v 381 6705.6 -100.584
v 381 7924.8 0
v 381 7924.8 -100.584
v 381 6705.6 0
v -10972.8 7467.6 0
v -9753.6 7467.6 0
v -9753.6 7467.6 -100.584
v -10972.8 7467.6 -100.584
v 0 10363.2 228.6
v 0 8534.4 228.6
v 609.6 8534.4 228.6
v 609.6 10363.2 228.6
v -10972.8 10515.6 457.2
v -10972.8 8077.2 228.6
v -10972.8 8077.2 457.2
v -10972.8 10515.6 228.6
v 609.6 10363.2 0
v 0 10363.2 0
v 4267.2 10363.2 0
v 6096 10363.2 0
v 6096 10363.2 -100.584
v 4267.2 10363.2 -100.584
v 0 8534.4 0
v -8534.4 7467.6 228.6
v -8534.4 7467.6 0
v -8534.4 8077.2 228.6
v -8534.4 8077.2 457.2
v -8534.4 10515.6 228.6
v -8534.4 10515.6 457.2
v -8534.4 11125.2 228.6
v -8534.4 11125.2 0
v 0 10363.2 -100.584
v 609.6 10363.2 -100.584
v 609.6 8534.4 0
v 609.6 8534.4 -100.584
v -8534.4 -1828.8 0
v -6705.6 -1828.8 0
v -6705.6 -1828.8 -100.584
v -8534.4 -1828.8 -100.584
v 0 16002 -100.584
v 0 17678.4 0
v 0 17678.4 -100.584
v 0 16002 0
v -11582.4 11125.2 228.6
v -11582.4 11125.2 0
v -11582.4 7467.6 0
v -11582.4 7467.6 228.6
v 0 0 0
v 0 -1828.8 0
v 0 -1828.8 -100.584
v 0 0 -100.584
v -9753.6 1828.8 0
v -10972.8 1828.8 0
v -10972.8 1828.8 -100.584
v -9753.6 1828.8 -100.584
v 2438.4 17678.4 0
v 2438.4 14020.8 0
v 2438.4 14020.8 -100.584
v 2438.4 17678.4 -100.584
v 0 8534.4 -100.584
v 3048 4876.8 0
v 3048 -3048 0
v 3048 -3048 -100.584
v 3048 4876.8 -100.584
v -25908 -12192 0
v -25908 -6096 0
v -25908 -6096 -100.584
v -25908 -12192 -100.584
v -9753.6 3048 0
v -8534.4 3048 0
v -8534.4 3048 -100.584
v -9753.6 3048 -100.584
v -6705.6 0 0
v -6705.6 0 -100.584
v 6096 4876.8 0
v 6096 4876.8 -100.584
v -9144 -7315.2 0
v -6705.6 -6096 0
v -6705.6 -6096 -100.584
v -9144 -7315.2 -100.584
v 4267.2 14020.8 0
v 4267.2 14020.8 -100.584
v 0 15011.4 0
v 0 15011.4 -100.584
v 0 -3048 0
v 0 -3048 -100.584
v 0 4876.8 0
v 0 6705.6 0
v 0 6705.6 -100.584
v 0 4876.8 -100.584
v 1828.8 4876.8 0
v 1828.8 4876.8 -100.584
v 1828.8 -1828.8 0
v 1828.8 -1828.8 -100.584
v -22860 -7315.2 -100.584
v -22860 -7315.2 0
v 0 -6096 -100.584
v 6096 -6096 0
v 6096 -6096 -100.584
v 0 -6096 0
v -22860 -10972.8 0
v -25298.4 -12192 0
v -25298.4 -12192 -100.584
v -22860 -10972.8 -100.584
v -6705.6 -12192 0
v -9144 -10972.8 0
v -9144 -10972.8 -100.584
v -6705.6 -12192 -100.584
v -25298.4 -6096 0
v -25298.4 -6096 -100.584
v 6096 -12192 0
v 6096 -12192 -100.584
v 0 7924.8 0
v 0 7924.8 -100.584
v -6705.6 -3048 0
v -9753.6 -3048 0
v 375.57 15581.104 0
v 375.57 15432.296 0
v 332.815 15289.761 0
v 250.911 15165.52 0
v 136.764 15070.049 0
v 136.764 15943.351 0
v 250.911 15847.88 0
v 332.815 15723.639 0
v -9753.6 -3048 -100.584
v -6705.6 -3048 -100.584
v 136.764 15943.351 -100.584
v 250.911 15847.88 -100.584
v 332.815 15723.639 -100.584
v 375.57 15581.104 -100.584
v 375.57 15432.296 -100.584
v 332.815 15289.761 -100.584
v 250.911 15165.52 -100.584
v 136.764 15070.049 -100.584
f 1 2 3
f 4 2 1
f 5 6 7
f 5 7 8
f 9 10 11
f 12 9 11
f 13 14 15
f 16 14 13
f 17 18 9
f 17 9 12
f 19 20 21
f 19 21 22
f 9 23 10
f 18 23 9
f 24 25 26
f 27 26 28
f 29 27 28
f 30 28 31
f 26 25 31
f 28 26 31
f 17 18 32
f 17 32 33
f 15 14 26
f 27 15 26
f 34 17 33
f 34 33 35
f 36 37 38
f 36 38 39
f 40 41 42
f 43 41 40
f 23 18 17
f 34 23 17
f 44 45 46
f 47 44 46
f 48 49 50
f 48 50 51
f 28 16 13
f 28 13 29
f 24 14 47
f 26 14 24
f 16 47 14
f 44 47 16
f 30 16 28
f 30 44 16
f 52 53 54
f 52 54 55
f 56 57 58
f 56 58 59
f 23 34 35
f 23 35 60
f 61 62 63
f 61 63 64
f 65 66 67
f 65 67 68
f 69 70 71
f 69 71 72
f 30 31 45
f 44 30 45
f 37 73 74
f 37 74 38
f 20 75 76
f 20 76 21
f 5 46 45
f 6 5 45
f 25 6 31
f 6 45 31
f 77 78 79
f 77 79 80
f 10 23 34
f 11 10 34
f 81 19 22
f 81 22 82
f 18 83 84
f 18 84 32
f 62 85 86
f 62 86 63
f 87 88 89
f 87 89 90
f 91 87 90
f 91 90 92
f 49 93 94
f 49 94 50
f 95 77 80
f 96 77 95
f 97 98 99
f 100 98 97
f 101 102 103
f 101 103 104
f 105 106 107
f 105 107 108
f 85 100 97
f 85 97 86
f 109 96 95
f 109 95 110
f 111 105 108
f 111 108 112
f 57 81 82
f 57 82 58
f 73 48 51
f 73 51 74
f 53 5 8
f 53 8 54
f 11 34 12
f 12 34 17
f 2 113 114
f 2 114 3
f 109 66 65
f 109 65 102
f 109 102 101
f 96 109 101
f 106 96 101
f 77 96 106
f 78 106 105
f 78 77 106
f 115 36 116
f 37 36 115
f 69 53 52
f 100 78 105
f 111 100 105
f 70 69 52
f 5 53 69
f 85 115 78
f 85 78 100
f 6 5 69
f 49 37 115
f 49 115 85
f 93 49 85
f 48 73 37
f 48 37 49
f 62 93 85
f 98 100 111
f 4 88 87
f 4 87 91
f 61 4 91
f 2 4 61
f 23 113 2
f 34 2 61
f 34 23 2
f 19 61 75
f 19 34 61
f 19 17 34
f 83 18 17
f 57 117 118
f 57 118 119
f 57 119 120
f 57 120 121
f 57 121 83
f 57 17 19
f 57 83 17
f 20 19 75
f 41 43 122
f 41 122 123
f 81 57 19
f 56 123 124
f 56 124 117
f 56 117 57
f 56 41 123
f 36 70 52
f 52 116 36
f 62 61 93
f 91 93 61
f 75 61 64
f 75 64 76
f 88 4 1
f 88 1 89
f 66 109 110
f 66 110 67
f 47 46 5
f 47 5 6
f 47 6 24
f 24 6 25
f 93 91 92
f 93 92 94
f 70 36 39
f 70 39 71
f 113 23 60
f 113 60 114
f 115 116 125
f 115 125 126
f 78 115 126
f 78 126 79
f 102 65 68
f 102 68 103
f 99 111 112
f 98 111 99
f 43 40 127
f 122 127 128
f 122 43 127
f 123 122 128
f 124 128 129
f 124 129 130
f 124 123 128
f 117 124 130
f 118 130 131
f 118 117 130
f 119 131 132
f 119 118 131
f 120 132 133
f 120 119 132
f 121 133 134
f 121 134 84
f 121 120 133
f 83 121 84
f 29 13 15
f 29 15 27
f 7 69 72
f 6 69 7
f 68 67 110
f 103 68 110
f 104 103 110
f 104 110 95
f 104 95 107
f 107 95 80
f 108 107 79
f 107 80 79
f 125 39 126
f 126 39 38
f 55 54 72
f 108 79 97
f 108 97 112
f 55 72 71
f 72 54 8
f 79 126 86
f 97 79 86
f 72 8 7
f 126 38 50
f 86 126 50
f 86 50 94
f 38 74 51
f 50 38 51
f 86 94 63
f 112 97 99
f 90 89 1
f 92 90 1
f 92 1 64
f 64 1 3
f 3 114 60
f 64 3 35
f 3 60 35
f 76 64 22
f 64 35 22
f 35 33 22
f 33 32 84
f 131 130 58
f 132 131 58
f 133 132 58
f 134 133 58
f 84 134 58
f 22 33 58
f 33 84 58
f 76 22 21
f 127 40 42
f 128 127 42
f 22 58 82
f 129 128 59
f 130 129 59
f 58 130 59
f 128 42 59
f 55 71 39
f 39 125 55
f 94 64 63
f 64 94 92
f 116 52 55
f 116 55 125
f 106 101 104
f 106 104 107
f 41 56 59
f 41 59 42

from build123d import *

# Parameters (mm, degrees)
F1_DEPTH = 100.584
F0_W     = 609.6
F0_H     = 1828.8
F2_DEPTH = 228.6
F0_W_2   = 2438.4
F0_H_2   = 2438.4
F3_DEPTH = 457.2


# Not quite as in the source:
# - a feature names something its author has since deleted; it is built from what else it names


with BuildPart() as f1:
    # F0 (on Top) → F1 (new body)
    with BuildSketch(Plane.XY):
        with BuildLine():
            Line((0, -1828.8), (0, 0))
            Line((0, 0), (-6705.6, 0))
            Line((-6705.6, 0), (-6705.6, -1828.8))
            Line((-6705.6, -1828.8), (-8534.4, -1828.8))
            Line((-8534.4, -1828.8), (-8534.4, 3048))
            Line((-8534.4, 3048), (-9753.6, 3048))
            Line((-9753.6, 3048), (-9753.6, 7467.6))
            Line((-9753.6, 7467.6), (-10972.8, 7467.6))
            Line((-10972.8, 7467.6), (-10972.8, 1828.8))
            Line((-10972.8, 1828.8), (-9753.6, 1828.8))
            Line((-9753.6, 1828.8), (-9753.6, -3048))
            Line((-9753.6, -3048), (-6705.6, -3048))
            Line((-6705.6, -3048), (-6705.6, -6096))
            Line((-6705.6, -6096), (-9144, -7315.2))
            Line((-9144, -7315.2), (-22860, -7315.2))
            Line((-22860, -7315.2), (-25298.4, -6096))
            Line((-25298.4, -6096), (-25908, -6096))
            Line((-25908, -6096), (-25908, -12192))
            Line((-25908, -12192), (-25298.4, -12192))
            Line((-25298.4, -12192), (-22860, -10972.8))
            Line((-22860, -10972.8), (-9144, -10972.8))
            Line((-9144, -10972.8), (-6705.6, -12192))
            Line((-6705.6, -12192), (6096, -12192))
            Line((6096, -12192), (6096, -6096))
            Line((6096, -6096), (0, -6096))
            Line((0, -6096), (0, -3048))
            Line((0, -3048), (3048, -3048))
            Line((3048, -3048), (3048, 4876.8))
            Line((3048, 4876.8), (4267.2, 4876.8))
            Line((4267.2, 4876.8), (6096, 4876.8))
            Line((6096, 4876.8), (6096, 10363.2))
            Line((6096, 10363.2), (4267.2, 10363.2))
            Line((4267.2, 10363.2), (4267.2, 14020.8))
            Line((4267.2, 14020.8), (2438.4, 14020.8))
            Line((2438.4, 14020.8), (2438.4, 17678.4))
            Line((2438.4, 17678.4000000001), (0, 17678.4000000001))
            Line((0, 17678.4), (0, 16002))
            ThreePointArc((0, 16002), (381, 15506.7), (0, 15011.4))
            Line((0, 15011.4), (0, 14020.8))
            Line((0, 14020.8), (457.2, 13106.4))
            Line((457.2, 13106.4), (457.2, 11277.6))
            Line((457.2, 11277.6), (0, 10363.2))
            Line((0, 10363.2), (609.6, 10363.2))
            Line((609.6, 10363.2), (609.6, 8534.4))
            Line((609.6, 8534.4), (0, 8534.4))
            Line((0, 8534.4), (0, 7924.8))
            Line((0, 7924.8), (381, 7924.8))
            Line((381, 7924.8), (381, 6705.6))
            Line((381, 6705.6), (0, 6705.6))
            Line((0, 6705.6), (0, 4876.8))
            Line((0, 4876.8), (1828.8, 4876.8))
            Line((1828.8, 4876.8), (1828.8, -1828.8))
            Line((1828.8, -1828.8), (0, -1828.8))
        make_face()
        Polygon((0, 14020.8), (0, 10363.2), (457.2, 11277.6), (457.2, 13106.4), align=None)
    extrude(amount=-F1_DEPTH)

    # F0 (on Top) → F2 (join)
    with BuildSketch(Plane.XY):
        with Locations((304.8, 9448.8)):
            Rectangle(F0_W, F0_H)
        Polygon((-10972.8, 7467.6), (-9753.6, 7467.6), (-8534.4, 7467.6), (-8534.4, 8077.2), (-10972.8, 8077.2), (-10972.8, 10515.6), (-8534.4, 10515.6), (-8534.4, 11125.2), (-11582.4, 11125.2), (-11582.4, 7467.6), align=None)
    extrude(amount=F2_DEPTH)

    # F0 (on Top) → F3 (join)
    with BuildSketch(Plane.XY):
        with Locations((-9753.6, 9296.4)):
            Rectangle(F0_W_2, F0_H_2)
    extrude(amount=F3_DEPTH)


solid = f1.part
